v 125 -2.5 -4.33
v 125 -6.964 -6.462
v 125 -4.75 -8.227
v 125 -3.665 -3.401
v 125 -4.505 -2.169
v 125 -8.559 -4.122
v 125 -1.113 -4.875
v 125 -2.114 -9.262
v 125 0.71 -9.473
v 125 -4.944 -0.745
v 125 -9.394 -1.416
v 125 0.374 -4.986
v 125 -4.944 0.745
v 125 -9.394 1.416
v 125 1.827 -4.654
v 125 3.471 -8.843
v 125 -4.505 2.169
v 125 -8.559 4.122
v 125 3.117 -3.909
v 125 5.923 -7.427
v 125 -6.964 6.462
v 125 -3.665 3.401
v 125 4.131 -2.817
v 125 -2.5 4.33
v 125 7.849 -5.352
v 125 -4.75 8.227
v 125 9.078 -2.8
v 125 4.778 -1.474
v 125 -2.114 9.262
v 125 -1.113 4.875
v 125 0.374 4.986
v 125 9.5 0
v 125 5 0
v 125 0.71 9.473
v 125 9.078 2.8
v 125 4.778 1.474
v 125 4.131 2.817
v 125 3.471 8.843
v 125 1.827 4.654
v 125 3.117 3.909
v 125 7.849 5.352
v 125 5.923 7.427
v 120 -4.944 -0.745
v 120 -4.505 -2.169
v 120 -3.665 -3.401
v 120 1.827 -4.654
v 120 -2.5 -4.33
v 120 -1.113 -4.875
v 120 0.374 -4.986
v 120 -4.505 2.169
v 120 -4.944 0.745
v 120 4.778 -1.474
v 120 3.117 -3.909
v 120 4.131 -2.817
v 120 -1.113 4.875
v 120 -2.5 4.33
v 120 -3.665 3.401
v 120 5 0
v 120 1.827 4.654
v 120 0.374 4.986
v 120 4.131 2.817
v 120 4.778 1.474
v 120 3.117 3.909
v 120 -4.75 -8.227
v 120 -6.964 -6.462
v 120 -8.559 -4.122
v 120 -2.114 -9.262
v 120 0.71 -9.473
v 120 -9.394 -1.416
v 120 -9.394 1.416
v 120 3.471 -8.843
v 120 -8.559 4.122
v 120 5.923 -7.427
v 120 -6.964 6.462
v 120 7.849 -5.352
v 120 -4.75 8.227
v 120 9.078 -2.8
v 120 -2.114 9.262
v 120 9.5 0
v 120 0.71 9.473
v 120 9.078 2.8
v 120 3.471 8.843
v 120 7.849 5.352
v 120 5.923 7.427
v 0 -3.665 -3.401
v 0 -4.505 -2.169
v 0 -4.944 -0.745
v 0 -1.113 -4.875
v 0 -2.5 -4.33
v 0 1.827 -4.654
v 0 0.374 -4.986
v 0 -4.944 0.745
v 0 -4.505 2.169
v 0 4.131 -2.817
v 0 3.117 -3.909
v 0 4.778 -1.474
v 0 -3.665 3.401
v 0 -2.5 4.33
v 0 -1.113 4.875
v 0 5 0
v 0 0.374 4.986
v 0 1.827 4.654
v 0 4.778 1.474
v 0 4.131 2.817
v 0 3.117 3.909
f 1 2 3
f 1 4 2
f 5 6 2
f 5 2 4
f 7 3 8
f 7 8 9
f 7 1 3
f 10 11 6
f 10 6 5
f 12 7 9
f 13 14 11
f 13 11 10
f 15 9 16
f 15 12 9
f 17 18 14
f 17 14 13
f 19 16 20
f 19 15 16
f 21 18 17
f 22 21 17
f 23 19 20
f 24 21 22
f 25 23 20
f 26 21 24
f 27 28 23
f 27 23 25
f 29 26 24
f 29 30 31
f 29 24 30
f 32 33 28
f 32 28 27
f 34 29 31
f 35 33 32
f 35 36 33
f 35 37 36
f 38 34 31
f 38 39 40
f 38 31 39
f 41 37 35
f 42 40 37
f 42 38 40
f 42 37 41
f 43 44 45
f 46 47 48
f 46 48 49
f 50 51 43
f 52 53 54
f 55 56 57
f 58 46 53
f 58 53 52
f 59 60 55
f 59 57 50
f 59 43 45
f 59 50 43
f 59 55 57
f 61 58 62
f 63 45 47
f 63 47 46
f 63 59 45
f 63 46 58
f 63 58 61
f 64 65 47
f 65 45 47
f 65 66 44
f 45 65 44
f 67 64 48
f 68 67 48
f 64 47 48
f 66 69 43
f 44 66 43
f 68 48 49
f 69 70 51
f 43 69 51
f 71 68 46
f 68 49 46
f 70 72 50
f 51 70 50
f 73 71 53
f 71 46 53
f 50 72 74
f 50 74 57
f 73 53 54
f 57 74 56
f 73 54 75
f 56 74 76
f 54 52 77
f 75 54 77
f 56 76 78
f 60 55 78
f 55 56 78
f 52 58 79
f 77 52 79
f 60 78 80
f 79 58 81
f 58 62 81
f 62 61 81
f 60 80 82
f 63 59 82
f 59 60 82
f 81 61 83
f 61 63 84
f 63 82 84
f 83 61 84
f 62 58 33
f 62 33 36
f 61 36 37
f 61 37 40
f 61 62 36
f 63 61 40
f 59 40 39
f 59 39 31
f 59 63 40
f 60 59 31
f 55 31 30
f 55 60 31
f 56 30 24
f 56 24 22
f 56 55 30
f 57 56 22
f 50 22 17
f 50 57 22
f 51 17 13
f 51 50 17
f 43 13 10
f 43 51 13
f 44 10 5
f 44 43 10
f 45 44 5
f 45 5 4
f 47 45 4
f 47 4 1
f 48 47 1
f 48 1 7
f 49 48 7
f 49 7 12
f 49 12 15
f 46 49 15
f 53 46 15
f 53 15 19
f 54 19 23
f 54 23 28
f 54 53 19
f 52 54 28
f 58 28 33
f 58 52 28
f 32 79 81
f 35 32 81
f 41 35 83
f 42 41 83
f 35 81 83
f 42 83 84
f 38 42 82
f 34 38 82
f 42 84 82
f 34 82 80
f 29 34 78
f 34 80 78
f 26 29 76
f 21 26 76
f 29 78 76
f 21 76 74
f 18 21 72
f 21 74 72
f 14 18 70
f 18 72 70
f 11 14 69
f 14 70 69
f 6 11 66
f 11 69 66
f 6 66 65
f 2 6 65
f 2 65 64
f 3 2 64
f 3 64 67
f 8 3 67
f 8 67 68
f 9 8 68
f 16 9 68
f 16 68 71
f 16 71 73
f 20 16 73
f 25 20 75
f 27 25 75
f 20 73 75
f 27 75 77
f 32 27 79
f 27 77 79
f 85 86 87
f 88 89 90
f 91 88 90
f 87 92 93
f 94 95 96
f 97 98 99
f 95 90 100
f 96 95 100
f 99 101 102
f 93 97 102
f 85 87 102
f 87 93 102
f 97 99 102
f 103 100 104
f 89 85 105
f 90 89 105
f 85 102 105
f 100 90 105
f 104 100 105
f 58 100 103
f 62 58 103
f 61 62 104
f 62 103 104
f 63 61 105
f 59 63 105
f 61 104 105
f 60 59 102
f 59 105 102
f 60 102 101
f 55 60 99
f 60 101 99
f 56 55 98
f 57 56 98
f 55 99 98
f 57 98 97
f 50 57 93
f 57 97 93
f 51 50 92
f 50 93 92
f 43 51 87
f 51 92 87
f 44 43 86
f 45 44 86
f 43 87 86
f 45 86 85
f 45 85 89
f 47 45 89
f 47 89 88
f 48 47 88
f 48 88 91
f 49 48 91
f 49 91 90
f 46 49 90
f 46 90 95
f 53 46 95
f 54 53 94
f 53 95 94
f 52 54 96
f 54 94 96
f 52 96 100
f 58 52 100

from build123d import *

# Parameters (mm, degrees)
F0_R     = 5
F1_DEPTH = 120
F2_R     = 9.5
F2_R_2   = 5
F3_DEPTH = 5


with BuildPart() as f1:
    # F0 (on Right) → F1 (new body)
    with BuildSketch(Plane.YZ):
        Circle(F0_R)
    extrude(amount=F1_DEPTH)


with BuildPart() as f3:
    # F2 (on face) → F3 (new body)
    with BuildSketch(Plane.YZ.offset(120)):
        Circle(F2_R)
        Circle(F2_R_2, mode=Mode.SUBTRACT)
    extrude(amount=F3_DEPTH)


solid = Compound([f1.part, f3.part])
